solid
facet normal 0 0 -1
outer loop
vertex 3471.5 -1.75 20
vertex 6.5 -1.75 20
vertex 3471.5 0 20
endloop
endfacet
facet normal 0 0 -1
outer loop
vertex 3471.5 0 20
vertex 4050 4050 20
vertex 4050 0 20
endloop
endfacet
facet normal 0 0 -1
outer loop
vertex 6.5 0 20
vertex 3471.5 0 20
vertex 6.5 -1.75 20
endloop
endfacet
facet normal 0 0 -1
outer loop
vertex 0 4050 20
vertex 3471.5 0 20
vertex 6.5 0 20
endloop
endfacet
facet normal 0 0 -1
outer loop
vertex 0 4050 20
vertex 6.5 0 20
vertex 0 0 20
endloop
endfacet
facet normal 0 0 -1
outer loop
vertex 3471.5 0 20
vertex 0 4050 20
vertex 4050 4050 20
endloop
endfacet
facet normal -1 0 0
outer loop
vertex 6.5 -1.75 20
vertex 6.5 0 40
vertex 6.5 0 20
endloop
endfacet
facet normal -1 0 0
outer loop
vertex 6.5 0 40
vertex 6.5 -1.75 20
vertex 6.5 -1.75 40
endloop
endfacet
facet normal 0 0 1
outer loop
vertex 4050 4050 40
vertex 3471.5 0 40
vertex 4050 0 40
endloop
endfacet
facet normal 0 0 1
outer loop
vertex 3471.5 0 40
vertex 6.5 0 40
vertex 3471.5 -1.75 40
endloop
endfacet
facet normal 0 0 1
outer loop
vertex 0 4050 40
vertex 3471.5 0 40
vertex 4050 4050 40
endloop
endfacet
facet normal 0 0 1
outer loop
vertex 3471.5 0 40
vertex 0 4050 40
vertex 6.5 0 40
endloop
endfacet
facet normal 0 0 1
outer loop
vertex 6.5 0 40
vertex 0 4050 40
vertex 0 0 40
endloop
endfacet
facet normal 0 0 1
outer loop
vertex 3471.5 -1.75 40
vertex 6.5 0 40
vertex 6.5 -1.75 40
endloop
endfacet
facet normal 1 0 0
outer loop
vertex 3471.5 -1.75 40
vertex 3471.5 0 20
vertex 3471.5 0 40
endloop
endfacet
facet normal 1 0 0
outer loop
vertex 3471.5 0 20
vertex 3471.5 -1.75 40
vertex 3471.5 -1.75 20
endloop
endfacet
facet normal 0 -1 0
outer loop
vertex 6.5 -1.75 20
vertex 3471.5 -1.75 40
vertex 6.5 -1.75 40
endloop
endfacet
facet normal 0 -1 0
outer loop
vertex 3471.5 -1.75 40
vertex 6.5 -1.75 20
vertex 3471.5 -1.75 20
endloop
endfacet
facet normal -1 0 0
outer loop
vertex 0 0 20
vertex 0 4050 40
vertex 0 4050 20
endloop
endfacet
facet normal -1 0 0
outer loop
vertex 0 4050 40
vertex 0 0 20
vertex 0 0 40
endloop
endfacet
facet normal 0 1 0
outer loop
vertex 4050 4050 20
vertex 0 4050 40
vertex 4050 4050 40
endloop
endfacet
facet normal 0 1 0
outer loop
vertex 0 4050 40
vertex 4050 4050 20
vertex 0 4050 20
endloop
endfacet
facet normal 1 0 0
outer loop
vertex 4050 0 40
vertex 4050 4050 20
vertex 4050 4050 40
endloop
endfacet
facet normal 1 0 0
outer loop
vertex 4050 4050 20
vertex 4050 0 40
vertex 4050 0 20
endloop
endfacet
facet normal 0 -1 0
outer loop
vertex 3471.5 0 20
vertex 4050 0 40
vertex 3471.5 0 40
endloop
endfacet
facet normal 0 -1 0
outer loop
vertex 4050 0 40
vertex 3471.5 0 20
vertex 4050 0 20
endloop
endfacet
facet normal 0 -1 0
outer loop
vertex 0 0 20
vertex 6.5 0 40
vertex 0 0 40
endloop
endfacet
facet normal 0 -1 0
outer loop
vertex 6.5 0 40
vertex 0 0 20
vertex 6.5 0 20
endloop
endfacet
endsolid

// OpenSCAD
// Dimensions in mm
X = 90;
Y = 45;
Z = 20;

// Slide dimensions
slide_X = 75;
slide_Y = 25;
slide_Z = 1;

// Slot dimensions
slot_X = slide_X + 2; // slot length is slide length plus 2mm on each side
slot_Y = 1.6;
slot_Z = 10;
slot_gap_Y = 3.5;

// Build the base block
translate([0, 0, Z]) {
    linear_extrude(Z) {
        square(X * Y);
    }
}

// Cut parallel slots into the top face
translate([X/2 - slot_X/2, Y/2 - (Y/2 + slot_gap_Y/2), Z]) {
    for (y = [0, slot_gap_Y]) {
        translate([0, y, 0])
            linear_extrude(Z) {
                square(slot_X * Y);
            }
    }
}
